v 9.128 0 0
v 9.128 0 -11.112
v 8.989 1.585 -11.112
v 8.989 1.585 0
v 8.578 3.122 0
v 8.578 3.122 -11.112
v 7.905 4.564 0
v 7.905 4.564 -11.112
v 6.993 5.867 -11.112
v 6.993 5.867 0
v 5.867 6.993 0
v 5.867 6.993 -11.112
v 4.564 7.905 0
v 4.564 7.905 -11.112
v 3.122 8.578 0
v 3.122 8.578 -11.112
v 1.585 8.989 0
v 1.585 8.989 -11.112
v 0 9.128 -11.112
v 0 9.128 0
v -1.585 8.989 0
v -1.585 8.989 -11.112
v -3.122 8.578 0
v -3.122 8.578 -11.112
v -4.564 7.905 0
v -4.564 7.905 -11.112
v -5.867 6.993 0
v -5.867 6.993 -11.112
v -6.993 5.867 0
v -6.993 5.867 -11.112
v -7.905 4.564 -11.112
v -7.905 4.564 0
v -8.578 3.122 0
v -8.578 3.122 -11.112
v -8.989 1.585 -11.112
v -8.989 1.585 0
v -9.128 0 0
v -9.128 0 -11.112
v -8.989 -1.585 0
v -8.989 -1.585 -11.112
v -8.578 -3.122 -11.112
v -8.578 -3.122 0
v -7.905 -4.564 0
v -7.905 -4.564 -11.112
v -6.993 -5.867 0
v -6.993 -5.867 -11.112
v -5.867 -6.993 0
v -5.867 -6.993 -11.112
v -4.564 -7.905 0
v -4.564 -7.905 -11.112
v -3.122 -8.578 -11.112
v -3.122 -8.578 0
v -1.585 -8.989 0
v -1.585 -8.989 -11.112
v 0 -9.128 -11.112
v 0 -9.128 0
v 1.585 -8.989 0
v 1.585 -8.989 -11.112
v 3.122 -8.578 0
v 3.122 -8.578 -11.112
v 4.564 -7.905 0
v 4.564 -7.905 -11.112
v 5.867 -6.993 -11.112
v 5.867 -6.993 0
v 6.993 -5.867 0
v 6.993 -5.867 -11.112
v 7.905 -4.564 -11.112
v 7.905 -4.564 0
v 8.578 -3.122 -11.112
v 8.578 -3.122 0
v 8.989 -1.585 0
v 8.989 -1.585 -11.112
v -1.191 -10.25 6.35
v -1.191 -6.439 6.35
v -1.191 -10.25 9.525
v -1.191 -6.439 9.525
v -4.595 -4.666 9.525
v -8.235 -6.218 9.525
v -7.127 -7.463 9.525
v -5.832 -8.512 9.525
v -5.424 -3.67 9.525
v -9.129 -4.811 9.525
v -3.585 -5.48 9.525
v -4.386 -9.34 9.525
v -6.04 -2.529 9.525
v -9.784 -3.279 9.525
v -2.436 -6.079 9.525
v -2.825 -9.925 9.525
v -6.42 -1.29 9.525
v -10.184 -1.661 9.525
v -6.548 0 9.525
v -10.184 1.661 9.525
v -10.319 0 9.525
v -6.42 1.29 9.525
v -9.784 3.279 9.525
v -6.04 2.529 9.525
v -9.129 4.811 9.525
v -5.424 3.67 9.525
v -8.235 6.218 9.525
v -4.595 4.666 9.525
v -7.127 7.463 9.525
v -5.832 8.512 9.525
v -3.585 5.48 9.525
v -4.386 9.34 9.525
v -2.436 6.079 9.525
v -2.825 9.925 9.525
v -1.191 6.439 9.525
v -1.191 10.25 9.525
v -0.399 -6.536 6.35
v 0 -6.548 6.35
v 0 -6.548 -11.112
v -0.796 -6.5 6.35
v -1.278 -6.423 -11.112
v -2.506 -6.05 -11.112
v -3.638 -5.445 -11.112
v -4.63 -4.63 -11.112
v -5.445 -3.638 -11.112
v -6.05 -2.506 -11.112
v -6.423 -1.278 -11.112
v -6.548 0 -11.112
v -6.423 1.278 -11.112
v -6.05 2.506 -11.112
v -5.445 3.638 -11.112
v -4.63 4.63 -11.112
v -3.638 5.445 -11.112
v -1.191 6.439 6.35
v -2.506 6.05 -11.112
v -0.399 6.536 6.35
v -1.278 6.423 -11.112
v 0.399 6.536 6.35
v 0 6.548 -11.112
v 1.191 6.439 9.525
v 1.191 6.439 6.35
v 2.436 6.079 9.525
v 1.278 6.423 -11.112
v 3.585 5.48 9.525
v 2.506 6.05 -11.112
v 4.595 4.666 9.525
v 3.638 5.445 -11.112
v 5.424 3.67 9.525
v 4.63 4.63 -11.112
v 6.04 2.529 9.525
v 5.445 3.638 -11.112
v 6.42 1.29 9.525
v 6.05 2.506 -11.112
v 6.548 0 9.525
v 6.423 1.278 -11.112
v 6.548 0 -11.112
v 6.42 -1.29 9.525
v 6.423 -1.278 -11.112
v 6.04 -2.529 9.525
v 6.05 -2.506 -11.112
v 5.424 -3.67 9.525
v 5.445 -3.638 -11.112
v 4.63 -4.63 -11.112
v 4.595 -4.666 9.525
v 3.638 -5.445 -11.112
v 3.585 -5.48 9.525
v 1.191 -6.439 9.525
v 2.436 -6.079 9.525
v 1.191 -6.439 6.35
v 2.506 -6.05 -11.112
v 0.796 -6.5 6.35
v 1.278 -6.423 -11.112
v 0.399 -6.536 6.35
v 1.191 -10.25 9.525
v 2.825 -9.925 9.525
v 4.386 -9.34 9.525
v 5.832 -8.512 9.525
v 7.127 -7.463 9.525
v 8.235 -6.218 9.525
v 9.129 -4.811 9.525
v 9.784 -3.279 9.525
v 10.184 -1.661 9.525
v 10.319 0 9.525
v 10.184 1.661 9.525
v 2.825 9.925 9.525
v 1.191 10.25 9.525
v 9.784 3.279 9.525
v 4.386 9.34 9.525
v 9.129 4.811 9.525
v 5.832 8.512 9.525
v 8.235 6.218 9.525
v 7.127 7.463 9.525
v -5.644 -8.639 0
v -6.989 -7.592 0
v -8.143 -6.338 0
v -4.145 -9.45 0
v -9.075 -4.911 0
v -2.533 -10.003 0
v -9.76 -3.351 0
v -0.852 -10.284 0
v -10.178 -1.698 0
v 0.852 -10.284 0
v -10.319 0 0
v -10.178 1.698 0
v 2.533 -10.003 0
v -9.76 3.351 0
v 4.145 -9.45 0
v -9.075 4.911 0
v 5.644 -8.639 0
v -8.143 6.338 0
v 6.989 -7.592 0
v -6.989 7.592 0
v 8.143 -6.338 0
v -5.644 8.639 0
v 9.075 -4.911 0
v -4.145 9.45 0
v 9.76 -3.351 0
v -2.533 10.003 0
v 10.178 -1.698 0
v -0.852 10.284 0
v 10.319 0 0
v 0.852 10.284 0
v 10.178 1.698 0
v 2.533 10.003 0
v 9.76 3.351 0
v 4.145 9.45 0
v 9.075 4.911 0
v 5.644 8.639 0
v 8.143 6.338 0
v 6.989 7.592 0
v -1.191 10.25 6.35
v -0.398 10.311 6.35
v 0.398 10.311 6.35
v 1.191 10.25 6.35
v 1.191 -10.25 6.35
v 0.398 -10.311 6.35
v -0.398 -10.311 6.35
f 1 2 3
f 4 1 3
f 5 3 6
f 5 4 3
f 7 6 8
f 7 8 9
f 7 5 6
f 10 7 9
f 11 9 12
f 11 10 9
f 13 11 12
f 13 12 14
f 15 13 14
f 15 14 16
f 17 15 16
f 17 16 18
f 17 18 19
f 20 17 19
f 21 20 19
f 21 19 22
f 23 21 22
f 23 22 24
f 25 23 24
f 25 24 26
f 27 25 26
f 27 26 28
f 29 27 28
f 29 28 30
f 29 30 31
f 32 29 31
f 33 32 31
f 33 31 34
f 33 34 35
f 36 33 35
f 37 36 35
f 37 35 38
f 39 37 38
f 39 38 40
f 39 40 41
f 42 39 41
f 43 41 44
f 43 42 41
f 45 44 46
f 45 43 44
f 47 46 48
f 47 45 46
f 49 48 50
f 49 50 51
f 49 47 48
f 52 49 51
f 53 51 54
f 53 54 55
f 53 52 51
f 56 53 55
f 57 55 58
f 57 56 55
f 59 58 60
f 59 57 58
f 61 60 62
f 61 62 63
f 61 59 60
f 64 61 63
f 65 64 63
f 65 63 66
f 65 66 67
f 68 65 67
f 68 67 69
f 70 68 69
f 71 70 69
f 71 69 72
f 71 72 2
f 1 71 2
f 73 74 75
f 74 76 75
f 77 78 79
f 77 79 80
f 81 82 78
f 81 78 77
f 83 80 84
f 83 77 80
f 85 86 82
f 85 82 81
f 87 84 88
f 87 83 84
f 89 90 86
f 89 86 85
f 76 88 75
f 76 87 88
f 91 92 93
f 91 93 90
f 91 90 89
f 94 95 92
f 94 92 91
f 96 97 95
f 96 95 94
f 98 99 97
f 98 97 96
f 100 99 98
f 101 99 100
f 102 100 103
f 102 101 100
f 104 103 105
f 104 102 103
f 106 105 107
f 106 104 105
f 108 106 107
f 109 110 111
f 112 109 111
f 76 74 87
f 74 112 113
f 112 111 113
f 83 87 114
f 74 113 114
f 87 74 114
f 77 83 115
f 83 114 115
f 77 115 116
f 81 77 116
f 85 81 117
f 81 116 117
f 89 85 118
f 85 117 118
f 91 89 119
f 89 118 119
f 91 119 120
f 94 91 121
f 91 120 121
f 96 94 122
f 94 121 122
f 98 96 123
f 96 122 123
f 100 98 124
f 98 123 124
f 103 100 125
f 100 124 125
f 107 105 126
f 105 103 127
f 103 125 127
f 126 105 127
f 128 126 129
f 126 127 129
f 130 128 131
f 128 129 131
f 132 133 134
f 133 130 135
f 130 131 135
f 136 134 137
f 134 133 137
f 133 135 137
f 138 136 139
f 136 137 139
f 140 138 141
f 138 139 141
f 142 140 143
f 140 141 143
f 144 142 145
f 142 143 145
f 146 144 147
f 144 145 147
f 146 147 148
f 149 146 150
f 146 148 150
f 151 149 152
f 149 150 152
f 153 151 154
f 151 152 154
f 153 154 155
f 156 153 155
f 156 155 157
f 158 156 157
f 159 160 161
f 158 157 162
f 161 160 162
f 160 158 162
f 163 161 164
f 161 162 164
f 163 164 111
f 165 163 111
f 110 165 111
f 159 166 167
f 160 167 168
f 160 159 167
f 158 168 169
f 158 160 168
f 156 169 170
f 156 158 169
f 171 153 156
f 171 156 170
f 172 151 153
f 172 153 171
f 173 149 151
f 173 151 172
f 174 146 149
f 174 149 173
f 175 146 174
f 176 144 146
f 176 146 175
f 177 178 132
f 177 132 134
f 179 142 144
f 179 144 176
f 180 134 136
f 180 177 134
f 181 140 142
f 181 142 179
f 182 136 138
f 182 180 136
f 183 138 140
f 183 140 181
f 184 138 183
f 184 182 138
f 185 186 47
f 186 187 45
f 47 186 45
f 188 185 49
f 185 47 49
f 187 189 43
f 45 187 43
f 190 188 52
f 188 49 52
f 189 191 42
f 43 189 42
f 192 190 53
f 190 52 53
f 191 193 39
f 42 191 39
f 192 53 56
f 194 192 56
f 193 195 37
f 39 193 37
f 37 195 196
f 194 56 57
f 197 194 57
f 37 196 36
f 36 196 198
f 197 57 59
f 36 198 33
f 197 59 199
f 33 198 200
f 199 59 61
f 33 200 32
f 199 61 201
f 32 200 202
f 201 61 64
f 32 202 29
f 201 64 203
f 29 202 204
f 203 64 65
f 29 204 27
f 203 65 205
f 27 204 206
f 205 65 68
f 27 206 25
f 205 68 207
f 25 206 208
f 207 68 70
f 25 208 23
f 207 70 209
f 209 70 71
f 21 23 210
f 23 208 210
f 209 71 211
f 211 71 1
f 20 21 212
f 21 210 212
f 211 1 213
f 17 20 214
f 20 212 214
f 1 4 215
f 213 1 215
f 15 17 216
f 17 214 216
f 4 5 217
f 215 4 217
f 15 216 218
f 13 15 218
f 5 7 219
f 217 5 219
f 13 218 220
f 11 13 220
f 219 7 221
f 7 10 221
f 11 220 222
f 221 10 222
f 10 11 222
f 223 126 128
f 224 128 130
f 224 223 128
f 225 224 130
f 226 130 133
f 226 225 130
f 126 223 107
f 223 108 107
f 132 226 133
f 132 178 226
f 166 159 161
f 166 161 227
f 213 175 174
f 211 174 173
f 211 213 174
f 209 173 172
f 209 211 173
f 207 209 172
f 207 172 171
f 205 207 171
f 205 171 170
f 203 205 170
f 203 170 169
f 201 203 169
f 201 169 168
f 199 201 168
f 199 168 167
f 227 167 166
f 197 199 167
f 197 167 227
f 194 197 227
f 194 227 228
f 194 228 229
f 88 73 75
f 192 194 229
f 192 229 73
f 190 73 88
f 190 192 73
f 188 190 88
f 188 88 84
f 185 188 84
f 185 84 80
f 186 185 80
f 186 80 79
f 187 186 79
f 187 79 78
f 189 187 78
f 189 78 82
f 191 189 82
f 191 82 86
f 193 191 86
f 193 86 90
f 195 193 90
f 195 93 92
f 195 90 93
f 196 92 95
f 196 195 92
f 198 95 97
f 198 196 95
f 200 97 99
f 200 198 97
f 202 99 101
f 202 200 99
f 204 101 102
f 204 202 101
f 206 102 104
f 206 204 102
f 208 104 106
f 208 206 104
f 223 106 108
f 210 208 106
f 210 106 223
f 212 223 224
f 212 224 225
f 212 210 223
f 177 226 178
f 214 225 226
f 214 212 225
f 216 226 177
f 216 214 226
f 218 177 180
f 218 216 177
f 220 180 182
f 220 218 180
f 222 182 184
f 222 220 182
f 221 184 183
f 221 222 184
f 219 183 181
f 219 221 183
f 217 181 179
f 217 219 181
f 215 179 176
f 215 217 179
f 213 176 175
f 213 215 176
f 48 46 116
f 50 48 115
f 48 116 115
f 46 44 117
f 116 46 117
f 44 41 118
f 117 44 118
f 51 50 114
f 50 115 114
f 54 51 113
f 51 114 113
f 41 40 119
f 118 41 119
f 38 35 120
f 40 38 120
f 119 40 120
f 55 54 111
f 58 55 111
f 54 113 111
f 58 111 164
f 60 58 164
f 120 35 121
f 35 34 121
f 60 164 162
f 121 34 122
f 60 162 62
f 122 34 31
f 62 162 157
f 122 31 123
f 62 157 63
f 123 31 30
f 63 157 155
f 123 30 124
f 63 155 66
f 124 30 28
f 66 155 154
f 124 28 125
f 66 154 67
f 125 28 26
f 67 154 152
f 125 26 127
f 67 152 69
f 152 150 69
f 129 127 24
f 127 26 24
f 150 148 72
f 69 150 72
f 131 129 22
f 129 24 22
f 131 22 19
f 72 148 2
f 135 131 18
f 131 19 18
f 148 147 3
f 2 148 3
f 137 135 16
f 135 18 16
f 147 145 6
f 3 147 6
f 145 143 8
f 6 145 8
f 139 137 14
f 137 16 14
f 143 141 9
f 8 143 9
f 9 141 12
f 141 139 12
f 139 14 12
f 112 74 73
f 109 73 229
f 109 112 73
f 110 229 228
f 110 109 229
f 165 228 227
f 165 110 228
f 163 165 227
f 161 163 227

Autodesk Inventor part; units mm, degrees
ref_plane "YZ Plane" through (0, 0, 0) normal (1, 0, 0) x (0, 1, 0)
ref_plane "XZ Plane" through (0, 0, 0) normal (0, 1, 0) x (-1, 0, 0)
ref_plane "XY Plane" through (0, 0, 0) normal (0, 0, 1) x (1, 0, 0)
sketch "Sketch1" plane through (0, 0, 0) normal (0, 0, 1) x (1, 0, 0)
  circle A0 centre (0, 0) radius 9.1281
  dimension "d0" = 18.2563
  dimension "d1" = 0
extrude "Extrusion1" add sketch "Sketch1" against normal blind 11.1125
sketch "Sketch2" plane through (0, 0, 0) normal (0, 0, 1) x (1, 0, 0)
  circle A0 centre (0, 0) radius 10.3188
  dimension "d15" = 20.6375
extrude "Extrusion2" add sketch "Sketch2" along normal blind 9.525
hole "Hole1" at (0, 0, 9.525) direction (0, 0, -1) diameter 13.0969 end through all
thread "Thread2" size "13/16-20 UNEF" class "2A" standard "ANSI Unified Screw Threads" length 9.525
sketch "Sketch3" plane through (0, 0, 9.525) normal (0, 0, 1) x (1, 0, 0)
  line L0 (0, -7.6975) -> (0, 10.1618) construction
  line L1 (0, 11.43) -> (1.1906, 11.43)
  line L2 (1.1906, 11.43) -> (1.1906, -11.43)
  line L3 (1.1906, -11.43) -> (0, -11.43)
  line L4 (0, 11.43) -> (-1.1906, 11.43)
  line L5 (-1.1906, 11.43) -> (-1.1906, -11.43)
  line L6 (-1.1906, -11.43) -> (0, -11.43)
  point P0 (0, 0)
  dimension "d22" = 1.1906
  dimension "d23" = 11.43
  dimension "d24" = 11.43
extrude "Extrusion3" cut sketch "Sketch3" against normal blind 3.175
properties part number "VS-005(COLLAR)" material "Steel, Carbon"
